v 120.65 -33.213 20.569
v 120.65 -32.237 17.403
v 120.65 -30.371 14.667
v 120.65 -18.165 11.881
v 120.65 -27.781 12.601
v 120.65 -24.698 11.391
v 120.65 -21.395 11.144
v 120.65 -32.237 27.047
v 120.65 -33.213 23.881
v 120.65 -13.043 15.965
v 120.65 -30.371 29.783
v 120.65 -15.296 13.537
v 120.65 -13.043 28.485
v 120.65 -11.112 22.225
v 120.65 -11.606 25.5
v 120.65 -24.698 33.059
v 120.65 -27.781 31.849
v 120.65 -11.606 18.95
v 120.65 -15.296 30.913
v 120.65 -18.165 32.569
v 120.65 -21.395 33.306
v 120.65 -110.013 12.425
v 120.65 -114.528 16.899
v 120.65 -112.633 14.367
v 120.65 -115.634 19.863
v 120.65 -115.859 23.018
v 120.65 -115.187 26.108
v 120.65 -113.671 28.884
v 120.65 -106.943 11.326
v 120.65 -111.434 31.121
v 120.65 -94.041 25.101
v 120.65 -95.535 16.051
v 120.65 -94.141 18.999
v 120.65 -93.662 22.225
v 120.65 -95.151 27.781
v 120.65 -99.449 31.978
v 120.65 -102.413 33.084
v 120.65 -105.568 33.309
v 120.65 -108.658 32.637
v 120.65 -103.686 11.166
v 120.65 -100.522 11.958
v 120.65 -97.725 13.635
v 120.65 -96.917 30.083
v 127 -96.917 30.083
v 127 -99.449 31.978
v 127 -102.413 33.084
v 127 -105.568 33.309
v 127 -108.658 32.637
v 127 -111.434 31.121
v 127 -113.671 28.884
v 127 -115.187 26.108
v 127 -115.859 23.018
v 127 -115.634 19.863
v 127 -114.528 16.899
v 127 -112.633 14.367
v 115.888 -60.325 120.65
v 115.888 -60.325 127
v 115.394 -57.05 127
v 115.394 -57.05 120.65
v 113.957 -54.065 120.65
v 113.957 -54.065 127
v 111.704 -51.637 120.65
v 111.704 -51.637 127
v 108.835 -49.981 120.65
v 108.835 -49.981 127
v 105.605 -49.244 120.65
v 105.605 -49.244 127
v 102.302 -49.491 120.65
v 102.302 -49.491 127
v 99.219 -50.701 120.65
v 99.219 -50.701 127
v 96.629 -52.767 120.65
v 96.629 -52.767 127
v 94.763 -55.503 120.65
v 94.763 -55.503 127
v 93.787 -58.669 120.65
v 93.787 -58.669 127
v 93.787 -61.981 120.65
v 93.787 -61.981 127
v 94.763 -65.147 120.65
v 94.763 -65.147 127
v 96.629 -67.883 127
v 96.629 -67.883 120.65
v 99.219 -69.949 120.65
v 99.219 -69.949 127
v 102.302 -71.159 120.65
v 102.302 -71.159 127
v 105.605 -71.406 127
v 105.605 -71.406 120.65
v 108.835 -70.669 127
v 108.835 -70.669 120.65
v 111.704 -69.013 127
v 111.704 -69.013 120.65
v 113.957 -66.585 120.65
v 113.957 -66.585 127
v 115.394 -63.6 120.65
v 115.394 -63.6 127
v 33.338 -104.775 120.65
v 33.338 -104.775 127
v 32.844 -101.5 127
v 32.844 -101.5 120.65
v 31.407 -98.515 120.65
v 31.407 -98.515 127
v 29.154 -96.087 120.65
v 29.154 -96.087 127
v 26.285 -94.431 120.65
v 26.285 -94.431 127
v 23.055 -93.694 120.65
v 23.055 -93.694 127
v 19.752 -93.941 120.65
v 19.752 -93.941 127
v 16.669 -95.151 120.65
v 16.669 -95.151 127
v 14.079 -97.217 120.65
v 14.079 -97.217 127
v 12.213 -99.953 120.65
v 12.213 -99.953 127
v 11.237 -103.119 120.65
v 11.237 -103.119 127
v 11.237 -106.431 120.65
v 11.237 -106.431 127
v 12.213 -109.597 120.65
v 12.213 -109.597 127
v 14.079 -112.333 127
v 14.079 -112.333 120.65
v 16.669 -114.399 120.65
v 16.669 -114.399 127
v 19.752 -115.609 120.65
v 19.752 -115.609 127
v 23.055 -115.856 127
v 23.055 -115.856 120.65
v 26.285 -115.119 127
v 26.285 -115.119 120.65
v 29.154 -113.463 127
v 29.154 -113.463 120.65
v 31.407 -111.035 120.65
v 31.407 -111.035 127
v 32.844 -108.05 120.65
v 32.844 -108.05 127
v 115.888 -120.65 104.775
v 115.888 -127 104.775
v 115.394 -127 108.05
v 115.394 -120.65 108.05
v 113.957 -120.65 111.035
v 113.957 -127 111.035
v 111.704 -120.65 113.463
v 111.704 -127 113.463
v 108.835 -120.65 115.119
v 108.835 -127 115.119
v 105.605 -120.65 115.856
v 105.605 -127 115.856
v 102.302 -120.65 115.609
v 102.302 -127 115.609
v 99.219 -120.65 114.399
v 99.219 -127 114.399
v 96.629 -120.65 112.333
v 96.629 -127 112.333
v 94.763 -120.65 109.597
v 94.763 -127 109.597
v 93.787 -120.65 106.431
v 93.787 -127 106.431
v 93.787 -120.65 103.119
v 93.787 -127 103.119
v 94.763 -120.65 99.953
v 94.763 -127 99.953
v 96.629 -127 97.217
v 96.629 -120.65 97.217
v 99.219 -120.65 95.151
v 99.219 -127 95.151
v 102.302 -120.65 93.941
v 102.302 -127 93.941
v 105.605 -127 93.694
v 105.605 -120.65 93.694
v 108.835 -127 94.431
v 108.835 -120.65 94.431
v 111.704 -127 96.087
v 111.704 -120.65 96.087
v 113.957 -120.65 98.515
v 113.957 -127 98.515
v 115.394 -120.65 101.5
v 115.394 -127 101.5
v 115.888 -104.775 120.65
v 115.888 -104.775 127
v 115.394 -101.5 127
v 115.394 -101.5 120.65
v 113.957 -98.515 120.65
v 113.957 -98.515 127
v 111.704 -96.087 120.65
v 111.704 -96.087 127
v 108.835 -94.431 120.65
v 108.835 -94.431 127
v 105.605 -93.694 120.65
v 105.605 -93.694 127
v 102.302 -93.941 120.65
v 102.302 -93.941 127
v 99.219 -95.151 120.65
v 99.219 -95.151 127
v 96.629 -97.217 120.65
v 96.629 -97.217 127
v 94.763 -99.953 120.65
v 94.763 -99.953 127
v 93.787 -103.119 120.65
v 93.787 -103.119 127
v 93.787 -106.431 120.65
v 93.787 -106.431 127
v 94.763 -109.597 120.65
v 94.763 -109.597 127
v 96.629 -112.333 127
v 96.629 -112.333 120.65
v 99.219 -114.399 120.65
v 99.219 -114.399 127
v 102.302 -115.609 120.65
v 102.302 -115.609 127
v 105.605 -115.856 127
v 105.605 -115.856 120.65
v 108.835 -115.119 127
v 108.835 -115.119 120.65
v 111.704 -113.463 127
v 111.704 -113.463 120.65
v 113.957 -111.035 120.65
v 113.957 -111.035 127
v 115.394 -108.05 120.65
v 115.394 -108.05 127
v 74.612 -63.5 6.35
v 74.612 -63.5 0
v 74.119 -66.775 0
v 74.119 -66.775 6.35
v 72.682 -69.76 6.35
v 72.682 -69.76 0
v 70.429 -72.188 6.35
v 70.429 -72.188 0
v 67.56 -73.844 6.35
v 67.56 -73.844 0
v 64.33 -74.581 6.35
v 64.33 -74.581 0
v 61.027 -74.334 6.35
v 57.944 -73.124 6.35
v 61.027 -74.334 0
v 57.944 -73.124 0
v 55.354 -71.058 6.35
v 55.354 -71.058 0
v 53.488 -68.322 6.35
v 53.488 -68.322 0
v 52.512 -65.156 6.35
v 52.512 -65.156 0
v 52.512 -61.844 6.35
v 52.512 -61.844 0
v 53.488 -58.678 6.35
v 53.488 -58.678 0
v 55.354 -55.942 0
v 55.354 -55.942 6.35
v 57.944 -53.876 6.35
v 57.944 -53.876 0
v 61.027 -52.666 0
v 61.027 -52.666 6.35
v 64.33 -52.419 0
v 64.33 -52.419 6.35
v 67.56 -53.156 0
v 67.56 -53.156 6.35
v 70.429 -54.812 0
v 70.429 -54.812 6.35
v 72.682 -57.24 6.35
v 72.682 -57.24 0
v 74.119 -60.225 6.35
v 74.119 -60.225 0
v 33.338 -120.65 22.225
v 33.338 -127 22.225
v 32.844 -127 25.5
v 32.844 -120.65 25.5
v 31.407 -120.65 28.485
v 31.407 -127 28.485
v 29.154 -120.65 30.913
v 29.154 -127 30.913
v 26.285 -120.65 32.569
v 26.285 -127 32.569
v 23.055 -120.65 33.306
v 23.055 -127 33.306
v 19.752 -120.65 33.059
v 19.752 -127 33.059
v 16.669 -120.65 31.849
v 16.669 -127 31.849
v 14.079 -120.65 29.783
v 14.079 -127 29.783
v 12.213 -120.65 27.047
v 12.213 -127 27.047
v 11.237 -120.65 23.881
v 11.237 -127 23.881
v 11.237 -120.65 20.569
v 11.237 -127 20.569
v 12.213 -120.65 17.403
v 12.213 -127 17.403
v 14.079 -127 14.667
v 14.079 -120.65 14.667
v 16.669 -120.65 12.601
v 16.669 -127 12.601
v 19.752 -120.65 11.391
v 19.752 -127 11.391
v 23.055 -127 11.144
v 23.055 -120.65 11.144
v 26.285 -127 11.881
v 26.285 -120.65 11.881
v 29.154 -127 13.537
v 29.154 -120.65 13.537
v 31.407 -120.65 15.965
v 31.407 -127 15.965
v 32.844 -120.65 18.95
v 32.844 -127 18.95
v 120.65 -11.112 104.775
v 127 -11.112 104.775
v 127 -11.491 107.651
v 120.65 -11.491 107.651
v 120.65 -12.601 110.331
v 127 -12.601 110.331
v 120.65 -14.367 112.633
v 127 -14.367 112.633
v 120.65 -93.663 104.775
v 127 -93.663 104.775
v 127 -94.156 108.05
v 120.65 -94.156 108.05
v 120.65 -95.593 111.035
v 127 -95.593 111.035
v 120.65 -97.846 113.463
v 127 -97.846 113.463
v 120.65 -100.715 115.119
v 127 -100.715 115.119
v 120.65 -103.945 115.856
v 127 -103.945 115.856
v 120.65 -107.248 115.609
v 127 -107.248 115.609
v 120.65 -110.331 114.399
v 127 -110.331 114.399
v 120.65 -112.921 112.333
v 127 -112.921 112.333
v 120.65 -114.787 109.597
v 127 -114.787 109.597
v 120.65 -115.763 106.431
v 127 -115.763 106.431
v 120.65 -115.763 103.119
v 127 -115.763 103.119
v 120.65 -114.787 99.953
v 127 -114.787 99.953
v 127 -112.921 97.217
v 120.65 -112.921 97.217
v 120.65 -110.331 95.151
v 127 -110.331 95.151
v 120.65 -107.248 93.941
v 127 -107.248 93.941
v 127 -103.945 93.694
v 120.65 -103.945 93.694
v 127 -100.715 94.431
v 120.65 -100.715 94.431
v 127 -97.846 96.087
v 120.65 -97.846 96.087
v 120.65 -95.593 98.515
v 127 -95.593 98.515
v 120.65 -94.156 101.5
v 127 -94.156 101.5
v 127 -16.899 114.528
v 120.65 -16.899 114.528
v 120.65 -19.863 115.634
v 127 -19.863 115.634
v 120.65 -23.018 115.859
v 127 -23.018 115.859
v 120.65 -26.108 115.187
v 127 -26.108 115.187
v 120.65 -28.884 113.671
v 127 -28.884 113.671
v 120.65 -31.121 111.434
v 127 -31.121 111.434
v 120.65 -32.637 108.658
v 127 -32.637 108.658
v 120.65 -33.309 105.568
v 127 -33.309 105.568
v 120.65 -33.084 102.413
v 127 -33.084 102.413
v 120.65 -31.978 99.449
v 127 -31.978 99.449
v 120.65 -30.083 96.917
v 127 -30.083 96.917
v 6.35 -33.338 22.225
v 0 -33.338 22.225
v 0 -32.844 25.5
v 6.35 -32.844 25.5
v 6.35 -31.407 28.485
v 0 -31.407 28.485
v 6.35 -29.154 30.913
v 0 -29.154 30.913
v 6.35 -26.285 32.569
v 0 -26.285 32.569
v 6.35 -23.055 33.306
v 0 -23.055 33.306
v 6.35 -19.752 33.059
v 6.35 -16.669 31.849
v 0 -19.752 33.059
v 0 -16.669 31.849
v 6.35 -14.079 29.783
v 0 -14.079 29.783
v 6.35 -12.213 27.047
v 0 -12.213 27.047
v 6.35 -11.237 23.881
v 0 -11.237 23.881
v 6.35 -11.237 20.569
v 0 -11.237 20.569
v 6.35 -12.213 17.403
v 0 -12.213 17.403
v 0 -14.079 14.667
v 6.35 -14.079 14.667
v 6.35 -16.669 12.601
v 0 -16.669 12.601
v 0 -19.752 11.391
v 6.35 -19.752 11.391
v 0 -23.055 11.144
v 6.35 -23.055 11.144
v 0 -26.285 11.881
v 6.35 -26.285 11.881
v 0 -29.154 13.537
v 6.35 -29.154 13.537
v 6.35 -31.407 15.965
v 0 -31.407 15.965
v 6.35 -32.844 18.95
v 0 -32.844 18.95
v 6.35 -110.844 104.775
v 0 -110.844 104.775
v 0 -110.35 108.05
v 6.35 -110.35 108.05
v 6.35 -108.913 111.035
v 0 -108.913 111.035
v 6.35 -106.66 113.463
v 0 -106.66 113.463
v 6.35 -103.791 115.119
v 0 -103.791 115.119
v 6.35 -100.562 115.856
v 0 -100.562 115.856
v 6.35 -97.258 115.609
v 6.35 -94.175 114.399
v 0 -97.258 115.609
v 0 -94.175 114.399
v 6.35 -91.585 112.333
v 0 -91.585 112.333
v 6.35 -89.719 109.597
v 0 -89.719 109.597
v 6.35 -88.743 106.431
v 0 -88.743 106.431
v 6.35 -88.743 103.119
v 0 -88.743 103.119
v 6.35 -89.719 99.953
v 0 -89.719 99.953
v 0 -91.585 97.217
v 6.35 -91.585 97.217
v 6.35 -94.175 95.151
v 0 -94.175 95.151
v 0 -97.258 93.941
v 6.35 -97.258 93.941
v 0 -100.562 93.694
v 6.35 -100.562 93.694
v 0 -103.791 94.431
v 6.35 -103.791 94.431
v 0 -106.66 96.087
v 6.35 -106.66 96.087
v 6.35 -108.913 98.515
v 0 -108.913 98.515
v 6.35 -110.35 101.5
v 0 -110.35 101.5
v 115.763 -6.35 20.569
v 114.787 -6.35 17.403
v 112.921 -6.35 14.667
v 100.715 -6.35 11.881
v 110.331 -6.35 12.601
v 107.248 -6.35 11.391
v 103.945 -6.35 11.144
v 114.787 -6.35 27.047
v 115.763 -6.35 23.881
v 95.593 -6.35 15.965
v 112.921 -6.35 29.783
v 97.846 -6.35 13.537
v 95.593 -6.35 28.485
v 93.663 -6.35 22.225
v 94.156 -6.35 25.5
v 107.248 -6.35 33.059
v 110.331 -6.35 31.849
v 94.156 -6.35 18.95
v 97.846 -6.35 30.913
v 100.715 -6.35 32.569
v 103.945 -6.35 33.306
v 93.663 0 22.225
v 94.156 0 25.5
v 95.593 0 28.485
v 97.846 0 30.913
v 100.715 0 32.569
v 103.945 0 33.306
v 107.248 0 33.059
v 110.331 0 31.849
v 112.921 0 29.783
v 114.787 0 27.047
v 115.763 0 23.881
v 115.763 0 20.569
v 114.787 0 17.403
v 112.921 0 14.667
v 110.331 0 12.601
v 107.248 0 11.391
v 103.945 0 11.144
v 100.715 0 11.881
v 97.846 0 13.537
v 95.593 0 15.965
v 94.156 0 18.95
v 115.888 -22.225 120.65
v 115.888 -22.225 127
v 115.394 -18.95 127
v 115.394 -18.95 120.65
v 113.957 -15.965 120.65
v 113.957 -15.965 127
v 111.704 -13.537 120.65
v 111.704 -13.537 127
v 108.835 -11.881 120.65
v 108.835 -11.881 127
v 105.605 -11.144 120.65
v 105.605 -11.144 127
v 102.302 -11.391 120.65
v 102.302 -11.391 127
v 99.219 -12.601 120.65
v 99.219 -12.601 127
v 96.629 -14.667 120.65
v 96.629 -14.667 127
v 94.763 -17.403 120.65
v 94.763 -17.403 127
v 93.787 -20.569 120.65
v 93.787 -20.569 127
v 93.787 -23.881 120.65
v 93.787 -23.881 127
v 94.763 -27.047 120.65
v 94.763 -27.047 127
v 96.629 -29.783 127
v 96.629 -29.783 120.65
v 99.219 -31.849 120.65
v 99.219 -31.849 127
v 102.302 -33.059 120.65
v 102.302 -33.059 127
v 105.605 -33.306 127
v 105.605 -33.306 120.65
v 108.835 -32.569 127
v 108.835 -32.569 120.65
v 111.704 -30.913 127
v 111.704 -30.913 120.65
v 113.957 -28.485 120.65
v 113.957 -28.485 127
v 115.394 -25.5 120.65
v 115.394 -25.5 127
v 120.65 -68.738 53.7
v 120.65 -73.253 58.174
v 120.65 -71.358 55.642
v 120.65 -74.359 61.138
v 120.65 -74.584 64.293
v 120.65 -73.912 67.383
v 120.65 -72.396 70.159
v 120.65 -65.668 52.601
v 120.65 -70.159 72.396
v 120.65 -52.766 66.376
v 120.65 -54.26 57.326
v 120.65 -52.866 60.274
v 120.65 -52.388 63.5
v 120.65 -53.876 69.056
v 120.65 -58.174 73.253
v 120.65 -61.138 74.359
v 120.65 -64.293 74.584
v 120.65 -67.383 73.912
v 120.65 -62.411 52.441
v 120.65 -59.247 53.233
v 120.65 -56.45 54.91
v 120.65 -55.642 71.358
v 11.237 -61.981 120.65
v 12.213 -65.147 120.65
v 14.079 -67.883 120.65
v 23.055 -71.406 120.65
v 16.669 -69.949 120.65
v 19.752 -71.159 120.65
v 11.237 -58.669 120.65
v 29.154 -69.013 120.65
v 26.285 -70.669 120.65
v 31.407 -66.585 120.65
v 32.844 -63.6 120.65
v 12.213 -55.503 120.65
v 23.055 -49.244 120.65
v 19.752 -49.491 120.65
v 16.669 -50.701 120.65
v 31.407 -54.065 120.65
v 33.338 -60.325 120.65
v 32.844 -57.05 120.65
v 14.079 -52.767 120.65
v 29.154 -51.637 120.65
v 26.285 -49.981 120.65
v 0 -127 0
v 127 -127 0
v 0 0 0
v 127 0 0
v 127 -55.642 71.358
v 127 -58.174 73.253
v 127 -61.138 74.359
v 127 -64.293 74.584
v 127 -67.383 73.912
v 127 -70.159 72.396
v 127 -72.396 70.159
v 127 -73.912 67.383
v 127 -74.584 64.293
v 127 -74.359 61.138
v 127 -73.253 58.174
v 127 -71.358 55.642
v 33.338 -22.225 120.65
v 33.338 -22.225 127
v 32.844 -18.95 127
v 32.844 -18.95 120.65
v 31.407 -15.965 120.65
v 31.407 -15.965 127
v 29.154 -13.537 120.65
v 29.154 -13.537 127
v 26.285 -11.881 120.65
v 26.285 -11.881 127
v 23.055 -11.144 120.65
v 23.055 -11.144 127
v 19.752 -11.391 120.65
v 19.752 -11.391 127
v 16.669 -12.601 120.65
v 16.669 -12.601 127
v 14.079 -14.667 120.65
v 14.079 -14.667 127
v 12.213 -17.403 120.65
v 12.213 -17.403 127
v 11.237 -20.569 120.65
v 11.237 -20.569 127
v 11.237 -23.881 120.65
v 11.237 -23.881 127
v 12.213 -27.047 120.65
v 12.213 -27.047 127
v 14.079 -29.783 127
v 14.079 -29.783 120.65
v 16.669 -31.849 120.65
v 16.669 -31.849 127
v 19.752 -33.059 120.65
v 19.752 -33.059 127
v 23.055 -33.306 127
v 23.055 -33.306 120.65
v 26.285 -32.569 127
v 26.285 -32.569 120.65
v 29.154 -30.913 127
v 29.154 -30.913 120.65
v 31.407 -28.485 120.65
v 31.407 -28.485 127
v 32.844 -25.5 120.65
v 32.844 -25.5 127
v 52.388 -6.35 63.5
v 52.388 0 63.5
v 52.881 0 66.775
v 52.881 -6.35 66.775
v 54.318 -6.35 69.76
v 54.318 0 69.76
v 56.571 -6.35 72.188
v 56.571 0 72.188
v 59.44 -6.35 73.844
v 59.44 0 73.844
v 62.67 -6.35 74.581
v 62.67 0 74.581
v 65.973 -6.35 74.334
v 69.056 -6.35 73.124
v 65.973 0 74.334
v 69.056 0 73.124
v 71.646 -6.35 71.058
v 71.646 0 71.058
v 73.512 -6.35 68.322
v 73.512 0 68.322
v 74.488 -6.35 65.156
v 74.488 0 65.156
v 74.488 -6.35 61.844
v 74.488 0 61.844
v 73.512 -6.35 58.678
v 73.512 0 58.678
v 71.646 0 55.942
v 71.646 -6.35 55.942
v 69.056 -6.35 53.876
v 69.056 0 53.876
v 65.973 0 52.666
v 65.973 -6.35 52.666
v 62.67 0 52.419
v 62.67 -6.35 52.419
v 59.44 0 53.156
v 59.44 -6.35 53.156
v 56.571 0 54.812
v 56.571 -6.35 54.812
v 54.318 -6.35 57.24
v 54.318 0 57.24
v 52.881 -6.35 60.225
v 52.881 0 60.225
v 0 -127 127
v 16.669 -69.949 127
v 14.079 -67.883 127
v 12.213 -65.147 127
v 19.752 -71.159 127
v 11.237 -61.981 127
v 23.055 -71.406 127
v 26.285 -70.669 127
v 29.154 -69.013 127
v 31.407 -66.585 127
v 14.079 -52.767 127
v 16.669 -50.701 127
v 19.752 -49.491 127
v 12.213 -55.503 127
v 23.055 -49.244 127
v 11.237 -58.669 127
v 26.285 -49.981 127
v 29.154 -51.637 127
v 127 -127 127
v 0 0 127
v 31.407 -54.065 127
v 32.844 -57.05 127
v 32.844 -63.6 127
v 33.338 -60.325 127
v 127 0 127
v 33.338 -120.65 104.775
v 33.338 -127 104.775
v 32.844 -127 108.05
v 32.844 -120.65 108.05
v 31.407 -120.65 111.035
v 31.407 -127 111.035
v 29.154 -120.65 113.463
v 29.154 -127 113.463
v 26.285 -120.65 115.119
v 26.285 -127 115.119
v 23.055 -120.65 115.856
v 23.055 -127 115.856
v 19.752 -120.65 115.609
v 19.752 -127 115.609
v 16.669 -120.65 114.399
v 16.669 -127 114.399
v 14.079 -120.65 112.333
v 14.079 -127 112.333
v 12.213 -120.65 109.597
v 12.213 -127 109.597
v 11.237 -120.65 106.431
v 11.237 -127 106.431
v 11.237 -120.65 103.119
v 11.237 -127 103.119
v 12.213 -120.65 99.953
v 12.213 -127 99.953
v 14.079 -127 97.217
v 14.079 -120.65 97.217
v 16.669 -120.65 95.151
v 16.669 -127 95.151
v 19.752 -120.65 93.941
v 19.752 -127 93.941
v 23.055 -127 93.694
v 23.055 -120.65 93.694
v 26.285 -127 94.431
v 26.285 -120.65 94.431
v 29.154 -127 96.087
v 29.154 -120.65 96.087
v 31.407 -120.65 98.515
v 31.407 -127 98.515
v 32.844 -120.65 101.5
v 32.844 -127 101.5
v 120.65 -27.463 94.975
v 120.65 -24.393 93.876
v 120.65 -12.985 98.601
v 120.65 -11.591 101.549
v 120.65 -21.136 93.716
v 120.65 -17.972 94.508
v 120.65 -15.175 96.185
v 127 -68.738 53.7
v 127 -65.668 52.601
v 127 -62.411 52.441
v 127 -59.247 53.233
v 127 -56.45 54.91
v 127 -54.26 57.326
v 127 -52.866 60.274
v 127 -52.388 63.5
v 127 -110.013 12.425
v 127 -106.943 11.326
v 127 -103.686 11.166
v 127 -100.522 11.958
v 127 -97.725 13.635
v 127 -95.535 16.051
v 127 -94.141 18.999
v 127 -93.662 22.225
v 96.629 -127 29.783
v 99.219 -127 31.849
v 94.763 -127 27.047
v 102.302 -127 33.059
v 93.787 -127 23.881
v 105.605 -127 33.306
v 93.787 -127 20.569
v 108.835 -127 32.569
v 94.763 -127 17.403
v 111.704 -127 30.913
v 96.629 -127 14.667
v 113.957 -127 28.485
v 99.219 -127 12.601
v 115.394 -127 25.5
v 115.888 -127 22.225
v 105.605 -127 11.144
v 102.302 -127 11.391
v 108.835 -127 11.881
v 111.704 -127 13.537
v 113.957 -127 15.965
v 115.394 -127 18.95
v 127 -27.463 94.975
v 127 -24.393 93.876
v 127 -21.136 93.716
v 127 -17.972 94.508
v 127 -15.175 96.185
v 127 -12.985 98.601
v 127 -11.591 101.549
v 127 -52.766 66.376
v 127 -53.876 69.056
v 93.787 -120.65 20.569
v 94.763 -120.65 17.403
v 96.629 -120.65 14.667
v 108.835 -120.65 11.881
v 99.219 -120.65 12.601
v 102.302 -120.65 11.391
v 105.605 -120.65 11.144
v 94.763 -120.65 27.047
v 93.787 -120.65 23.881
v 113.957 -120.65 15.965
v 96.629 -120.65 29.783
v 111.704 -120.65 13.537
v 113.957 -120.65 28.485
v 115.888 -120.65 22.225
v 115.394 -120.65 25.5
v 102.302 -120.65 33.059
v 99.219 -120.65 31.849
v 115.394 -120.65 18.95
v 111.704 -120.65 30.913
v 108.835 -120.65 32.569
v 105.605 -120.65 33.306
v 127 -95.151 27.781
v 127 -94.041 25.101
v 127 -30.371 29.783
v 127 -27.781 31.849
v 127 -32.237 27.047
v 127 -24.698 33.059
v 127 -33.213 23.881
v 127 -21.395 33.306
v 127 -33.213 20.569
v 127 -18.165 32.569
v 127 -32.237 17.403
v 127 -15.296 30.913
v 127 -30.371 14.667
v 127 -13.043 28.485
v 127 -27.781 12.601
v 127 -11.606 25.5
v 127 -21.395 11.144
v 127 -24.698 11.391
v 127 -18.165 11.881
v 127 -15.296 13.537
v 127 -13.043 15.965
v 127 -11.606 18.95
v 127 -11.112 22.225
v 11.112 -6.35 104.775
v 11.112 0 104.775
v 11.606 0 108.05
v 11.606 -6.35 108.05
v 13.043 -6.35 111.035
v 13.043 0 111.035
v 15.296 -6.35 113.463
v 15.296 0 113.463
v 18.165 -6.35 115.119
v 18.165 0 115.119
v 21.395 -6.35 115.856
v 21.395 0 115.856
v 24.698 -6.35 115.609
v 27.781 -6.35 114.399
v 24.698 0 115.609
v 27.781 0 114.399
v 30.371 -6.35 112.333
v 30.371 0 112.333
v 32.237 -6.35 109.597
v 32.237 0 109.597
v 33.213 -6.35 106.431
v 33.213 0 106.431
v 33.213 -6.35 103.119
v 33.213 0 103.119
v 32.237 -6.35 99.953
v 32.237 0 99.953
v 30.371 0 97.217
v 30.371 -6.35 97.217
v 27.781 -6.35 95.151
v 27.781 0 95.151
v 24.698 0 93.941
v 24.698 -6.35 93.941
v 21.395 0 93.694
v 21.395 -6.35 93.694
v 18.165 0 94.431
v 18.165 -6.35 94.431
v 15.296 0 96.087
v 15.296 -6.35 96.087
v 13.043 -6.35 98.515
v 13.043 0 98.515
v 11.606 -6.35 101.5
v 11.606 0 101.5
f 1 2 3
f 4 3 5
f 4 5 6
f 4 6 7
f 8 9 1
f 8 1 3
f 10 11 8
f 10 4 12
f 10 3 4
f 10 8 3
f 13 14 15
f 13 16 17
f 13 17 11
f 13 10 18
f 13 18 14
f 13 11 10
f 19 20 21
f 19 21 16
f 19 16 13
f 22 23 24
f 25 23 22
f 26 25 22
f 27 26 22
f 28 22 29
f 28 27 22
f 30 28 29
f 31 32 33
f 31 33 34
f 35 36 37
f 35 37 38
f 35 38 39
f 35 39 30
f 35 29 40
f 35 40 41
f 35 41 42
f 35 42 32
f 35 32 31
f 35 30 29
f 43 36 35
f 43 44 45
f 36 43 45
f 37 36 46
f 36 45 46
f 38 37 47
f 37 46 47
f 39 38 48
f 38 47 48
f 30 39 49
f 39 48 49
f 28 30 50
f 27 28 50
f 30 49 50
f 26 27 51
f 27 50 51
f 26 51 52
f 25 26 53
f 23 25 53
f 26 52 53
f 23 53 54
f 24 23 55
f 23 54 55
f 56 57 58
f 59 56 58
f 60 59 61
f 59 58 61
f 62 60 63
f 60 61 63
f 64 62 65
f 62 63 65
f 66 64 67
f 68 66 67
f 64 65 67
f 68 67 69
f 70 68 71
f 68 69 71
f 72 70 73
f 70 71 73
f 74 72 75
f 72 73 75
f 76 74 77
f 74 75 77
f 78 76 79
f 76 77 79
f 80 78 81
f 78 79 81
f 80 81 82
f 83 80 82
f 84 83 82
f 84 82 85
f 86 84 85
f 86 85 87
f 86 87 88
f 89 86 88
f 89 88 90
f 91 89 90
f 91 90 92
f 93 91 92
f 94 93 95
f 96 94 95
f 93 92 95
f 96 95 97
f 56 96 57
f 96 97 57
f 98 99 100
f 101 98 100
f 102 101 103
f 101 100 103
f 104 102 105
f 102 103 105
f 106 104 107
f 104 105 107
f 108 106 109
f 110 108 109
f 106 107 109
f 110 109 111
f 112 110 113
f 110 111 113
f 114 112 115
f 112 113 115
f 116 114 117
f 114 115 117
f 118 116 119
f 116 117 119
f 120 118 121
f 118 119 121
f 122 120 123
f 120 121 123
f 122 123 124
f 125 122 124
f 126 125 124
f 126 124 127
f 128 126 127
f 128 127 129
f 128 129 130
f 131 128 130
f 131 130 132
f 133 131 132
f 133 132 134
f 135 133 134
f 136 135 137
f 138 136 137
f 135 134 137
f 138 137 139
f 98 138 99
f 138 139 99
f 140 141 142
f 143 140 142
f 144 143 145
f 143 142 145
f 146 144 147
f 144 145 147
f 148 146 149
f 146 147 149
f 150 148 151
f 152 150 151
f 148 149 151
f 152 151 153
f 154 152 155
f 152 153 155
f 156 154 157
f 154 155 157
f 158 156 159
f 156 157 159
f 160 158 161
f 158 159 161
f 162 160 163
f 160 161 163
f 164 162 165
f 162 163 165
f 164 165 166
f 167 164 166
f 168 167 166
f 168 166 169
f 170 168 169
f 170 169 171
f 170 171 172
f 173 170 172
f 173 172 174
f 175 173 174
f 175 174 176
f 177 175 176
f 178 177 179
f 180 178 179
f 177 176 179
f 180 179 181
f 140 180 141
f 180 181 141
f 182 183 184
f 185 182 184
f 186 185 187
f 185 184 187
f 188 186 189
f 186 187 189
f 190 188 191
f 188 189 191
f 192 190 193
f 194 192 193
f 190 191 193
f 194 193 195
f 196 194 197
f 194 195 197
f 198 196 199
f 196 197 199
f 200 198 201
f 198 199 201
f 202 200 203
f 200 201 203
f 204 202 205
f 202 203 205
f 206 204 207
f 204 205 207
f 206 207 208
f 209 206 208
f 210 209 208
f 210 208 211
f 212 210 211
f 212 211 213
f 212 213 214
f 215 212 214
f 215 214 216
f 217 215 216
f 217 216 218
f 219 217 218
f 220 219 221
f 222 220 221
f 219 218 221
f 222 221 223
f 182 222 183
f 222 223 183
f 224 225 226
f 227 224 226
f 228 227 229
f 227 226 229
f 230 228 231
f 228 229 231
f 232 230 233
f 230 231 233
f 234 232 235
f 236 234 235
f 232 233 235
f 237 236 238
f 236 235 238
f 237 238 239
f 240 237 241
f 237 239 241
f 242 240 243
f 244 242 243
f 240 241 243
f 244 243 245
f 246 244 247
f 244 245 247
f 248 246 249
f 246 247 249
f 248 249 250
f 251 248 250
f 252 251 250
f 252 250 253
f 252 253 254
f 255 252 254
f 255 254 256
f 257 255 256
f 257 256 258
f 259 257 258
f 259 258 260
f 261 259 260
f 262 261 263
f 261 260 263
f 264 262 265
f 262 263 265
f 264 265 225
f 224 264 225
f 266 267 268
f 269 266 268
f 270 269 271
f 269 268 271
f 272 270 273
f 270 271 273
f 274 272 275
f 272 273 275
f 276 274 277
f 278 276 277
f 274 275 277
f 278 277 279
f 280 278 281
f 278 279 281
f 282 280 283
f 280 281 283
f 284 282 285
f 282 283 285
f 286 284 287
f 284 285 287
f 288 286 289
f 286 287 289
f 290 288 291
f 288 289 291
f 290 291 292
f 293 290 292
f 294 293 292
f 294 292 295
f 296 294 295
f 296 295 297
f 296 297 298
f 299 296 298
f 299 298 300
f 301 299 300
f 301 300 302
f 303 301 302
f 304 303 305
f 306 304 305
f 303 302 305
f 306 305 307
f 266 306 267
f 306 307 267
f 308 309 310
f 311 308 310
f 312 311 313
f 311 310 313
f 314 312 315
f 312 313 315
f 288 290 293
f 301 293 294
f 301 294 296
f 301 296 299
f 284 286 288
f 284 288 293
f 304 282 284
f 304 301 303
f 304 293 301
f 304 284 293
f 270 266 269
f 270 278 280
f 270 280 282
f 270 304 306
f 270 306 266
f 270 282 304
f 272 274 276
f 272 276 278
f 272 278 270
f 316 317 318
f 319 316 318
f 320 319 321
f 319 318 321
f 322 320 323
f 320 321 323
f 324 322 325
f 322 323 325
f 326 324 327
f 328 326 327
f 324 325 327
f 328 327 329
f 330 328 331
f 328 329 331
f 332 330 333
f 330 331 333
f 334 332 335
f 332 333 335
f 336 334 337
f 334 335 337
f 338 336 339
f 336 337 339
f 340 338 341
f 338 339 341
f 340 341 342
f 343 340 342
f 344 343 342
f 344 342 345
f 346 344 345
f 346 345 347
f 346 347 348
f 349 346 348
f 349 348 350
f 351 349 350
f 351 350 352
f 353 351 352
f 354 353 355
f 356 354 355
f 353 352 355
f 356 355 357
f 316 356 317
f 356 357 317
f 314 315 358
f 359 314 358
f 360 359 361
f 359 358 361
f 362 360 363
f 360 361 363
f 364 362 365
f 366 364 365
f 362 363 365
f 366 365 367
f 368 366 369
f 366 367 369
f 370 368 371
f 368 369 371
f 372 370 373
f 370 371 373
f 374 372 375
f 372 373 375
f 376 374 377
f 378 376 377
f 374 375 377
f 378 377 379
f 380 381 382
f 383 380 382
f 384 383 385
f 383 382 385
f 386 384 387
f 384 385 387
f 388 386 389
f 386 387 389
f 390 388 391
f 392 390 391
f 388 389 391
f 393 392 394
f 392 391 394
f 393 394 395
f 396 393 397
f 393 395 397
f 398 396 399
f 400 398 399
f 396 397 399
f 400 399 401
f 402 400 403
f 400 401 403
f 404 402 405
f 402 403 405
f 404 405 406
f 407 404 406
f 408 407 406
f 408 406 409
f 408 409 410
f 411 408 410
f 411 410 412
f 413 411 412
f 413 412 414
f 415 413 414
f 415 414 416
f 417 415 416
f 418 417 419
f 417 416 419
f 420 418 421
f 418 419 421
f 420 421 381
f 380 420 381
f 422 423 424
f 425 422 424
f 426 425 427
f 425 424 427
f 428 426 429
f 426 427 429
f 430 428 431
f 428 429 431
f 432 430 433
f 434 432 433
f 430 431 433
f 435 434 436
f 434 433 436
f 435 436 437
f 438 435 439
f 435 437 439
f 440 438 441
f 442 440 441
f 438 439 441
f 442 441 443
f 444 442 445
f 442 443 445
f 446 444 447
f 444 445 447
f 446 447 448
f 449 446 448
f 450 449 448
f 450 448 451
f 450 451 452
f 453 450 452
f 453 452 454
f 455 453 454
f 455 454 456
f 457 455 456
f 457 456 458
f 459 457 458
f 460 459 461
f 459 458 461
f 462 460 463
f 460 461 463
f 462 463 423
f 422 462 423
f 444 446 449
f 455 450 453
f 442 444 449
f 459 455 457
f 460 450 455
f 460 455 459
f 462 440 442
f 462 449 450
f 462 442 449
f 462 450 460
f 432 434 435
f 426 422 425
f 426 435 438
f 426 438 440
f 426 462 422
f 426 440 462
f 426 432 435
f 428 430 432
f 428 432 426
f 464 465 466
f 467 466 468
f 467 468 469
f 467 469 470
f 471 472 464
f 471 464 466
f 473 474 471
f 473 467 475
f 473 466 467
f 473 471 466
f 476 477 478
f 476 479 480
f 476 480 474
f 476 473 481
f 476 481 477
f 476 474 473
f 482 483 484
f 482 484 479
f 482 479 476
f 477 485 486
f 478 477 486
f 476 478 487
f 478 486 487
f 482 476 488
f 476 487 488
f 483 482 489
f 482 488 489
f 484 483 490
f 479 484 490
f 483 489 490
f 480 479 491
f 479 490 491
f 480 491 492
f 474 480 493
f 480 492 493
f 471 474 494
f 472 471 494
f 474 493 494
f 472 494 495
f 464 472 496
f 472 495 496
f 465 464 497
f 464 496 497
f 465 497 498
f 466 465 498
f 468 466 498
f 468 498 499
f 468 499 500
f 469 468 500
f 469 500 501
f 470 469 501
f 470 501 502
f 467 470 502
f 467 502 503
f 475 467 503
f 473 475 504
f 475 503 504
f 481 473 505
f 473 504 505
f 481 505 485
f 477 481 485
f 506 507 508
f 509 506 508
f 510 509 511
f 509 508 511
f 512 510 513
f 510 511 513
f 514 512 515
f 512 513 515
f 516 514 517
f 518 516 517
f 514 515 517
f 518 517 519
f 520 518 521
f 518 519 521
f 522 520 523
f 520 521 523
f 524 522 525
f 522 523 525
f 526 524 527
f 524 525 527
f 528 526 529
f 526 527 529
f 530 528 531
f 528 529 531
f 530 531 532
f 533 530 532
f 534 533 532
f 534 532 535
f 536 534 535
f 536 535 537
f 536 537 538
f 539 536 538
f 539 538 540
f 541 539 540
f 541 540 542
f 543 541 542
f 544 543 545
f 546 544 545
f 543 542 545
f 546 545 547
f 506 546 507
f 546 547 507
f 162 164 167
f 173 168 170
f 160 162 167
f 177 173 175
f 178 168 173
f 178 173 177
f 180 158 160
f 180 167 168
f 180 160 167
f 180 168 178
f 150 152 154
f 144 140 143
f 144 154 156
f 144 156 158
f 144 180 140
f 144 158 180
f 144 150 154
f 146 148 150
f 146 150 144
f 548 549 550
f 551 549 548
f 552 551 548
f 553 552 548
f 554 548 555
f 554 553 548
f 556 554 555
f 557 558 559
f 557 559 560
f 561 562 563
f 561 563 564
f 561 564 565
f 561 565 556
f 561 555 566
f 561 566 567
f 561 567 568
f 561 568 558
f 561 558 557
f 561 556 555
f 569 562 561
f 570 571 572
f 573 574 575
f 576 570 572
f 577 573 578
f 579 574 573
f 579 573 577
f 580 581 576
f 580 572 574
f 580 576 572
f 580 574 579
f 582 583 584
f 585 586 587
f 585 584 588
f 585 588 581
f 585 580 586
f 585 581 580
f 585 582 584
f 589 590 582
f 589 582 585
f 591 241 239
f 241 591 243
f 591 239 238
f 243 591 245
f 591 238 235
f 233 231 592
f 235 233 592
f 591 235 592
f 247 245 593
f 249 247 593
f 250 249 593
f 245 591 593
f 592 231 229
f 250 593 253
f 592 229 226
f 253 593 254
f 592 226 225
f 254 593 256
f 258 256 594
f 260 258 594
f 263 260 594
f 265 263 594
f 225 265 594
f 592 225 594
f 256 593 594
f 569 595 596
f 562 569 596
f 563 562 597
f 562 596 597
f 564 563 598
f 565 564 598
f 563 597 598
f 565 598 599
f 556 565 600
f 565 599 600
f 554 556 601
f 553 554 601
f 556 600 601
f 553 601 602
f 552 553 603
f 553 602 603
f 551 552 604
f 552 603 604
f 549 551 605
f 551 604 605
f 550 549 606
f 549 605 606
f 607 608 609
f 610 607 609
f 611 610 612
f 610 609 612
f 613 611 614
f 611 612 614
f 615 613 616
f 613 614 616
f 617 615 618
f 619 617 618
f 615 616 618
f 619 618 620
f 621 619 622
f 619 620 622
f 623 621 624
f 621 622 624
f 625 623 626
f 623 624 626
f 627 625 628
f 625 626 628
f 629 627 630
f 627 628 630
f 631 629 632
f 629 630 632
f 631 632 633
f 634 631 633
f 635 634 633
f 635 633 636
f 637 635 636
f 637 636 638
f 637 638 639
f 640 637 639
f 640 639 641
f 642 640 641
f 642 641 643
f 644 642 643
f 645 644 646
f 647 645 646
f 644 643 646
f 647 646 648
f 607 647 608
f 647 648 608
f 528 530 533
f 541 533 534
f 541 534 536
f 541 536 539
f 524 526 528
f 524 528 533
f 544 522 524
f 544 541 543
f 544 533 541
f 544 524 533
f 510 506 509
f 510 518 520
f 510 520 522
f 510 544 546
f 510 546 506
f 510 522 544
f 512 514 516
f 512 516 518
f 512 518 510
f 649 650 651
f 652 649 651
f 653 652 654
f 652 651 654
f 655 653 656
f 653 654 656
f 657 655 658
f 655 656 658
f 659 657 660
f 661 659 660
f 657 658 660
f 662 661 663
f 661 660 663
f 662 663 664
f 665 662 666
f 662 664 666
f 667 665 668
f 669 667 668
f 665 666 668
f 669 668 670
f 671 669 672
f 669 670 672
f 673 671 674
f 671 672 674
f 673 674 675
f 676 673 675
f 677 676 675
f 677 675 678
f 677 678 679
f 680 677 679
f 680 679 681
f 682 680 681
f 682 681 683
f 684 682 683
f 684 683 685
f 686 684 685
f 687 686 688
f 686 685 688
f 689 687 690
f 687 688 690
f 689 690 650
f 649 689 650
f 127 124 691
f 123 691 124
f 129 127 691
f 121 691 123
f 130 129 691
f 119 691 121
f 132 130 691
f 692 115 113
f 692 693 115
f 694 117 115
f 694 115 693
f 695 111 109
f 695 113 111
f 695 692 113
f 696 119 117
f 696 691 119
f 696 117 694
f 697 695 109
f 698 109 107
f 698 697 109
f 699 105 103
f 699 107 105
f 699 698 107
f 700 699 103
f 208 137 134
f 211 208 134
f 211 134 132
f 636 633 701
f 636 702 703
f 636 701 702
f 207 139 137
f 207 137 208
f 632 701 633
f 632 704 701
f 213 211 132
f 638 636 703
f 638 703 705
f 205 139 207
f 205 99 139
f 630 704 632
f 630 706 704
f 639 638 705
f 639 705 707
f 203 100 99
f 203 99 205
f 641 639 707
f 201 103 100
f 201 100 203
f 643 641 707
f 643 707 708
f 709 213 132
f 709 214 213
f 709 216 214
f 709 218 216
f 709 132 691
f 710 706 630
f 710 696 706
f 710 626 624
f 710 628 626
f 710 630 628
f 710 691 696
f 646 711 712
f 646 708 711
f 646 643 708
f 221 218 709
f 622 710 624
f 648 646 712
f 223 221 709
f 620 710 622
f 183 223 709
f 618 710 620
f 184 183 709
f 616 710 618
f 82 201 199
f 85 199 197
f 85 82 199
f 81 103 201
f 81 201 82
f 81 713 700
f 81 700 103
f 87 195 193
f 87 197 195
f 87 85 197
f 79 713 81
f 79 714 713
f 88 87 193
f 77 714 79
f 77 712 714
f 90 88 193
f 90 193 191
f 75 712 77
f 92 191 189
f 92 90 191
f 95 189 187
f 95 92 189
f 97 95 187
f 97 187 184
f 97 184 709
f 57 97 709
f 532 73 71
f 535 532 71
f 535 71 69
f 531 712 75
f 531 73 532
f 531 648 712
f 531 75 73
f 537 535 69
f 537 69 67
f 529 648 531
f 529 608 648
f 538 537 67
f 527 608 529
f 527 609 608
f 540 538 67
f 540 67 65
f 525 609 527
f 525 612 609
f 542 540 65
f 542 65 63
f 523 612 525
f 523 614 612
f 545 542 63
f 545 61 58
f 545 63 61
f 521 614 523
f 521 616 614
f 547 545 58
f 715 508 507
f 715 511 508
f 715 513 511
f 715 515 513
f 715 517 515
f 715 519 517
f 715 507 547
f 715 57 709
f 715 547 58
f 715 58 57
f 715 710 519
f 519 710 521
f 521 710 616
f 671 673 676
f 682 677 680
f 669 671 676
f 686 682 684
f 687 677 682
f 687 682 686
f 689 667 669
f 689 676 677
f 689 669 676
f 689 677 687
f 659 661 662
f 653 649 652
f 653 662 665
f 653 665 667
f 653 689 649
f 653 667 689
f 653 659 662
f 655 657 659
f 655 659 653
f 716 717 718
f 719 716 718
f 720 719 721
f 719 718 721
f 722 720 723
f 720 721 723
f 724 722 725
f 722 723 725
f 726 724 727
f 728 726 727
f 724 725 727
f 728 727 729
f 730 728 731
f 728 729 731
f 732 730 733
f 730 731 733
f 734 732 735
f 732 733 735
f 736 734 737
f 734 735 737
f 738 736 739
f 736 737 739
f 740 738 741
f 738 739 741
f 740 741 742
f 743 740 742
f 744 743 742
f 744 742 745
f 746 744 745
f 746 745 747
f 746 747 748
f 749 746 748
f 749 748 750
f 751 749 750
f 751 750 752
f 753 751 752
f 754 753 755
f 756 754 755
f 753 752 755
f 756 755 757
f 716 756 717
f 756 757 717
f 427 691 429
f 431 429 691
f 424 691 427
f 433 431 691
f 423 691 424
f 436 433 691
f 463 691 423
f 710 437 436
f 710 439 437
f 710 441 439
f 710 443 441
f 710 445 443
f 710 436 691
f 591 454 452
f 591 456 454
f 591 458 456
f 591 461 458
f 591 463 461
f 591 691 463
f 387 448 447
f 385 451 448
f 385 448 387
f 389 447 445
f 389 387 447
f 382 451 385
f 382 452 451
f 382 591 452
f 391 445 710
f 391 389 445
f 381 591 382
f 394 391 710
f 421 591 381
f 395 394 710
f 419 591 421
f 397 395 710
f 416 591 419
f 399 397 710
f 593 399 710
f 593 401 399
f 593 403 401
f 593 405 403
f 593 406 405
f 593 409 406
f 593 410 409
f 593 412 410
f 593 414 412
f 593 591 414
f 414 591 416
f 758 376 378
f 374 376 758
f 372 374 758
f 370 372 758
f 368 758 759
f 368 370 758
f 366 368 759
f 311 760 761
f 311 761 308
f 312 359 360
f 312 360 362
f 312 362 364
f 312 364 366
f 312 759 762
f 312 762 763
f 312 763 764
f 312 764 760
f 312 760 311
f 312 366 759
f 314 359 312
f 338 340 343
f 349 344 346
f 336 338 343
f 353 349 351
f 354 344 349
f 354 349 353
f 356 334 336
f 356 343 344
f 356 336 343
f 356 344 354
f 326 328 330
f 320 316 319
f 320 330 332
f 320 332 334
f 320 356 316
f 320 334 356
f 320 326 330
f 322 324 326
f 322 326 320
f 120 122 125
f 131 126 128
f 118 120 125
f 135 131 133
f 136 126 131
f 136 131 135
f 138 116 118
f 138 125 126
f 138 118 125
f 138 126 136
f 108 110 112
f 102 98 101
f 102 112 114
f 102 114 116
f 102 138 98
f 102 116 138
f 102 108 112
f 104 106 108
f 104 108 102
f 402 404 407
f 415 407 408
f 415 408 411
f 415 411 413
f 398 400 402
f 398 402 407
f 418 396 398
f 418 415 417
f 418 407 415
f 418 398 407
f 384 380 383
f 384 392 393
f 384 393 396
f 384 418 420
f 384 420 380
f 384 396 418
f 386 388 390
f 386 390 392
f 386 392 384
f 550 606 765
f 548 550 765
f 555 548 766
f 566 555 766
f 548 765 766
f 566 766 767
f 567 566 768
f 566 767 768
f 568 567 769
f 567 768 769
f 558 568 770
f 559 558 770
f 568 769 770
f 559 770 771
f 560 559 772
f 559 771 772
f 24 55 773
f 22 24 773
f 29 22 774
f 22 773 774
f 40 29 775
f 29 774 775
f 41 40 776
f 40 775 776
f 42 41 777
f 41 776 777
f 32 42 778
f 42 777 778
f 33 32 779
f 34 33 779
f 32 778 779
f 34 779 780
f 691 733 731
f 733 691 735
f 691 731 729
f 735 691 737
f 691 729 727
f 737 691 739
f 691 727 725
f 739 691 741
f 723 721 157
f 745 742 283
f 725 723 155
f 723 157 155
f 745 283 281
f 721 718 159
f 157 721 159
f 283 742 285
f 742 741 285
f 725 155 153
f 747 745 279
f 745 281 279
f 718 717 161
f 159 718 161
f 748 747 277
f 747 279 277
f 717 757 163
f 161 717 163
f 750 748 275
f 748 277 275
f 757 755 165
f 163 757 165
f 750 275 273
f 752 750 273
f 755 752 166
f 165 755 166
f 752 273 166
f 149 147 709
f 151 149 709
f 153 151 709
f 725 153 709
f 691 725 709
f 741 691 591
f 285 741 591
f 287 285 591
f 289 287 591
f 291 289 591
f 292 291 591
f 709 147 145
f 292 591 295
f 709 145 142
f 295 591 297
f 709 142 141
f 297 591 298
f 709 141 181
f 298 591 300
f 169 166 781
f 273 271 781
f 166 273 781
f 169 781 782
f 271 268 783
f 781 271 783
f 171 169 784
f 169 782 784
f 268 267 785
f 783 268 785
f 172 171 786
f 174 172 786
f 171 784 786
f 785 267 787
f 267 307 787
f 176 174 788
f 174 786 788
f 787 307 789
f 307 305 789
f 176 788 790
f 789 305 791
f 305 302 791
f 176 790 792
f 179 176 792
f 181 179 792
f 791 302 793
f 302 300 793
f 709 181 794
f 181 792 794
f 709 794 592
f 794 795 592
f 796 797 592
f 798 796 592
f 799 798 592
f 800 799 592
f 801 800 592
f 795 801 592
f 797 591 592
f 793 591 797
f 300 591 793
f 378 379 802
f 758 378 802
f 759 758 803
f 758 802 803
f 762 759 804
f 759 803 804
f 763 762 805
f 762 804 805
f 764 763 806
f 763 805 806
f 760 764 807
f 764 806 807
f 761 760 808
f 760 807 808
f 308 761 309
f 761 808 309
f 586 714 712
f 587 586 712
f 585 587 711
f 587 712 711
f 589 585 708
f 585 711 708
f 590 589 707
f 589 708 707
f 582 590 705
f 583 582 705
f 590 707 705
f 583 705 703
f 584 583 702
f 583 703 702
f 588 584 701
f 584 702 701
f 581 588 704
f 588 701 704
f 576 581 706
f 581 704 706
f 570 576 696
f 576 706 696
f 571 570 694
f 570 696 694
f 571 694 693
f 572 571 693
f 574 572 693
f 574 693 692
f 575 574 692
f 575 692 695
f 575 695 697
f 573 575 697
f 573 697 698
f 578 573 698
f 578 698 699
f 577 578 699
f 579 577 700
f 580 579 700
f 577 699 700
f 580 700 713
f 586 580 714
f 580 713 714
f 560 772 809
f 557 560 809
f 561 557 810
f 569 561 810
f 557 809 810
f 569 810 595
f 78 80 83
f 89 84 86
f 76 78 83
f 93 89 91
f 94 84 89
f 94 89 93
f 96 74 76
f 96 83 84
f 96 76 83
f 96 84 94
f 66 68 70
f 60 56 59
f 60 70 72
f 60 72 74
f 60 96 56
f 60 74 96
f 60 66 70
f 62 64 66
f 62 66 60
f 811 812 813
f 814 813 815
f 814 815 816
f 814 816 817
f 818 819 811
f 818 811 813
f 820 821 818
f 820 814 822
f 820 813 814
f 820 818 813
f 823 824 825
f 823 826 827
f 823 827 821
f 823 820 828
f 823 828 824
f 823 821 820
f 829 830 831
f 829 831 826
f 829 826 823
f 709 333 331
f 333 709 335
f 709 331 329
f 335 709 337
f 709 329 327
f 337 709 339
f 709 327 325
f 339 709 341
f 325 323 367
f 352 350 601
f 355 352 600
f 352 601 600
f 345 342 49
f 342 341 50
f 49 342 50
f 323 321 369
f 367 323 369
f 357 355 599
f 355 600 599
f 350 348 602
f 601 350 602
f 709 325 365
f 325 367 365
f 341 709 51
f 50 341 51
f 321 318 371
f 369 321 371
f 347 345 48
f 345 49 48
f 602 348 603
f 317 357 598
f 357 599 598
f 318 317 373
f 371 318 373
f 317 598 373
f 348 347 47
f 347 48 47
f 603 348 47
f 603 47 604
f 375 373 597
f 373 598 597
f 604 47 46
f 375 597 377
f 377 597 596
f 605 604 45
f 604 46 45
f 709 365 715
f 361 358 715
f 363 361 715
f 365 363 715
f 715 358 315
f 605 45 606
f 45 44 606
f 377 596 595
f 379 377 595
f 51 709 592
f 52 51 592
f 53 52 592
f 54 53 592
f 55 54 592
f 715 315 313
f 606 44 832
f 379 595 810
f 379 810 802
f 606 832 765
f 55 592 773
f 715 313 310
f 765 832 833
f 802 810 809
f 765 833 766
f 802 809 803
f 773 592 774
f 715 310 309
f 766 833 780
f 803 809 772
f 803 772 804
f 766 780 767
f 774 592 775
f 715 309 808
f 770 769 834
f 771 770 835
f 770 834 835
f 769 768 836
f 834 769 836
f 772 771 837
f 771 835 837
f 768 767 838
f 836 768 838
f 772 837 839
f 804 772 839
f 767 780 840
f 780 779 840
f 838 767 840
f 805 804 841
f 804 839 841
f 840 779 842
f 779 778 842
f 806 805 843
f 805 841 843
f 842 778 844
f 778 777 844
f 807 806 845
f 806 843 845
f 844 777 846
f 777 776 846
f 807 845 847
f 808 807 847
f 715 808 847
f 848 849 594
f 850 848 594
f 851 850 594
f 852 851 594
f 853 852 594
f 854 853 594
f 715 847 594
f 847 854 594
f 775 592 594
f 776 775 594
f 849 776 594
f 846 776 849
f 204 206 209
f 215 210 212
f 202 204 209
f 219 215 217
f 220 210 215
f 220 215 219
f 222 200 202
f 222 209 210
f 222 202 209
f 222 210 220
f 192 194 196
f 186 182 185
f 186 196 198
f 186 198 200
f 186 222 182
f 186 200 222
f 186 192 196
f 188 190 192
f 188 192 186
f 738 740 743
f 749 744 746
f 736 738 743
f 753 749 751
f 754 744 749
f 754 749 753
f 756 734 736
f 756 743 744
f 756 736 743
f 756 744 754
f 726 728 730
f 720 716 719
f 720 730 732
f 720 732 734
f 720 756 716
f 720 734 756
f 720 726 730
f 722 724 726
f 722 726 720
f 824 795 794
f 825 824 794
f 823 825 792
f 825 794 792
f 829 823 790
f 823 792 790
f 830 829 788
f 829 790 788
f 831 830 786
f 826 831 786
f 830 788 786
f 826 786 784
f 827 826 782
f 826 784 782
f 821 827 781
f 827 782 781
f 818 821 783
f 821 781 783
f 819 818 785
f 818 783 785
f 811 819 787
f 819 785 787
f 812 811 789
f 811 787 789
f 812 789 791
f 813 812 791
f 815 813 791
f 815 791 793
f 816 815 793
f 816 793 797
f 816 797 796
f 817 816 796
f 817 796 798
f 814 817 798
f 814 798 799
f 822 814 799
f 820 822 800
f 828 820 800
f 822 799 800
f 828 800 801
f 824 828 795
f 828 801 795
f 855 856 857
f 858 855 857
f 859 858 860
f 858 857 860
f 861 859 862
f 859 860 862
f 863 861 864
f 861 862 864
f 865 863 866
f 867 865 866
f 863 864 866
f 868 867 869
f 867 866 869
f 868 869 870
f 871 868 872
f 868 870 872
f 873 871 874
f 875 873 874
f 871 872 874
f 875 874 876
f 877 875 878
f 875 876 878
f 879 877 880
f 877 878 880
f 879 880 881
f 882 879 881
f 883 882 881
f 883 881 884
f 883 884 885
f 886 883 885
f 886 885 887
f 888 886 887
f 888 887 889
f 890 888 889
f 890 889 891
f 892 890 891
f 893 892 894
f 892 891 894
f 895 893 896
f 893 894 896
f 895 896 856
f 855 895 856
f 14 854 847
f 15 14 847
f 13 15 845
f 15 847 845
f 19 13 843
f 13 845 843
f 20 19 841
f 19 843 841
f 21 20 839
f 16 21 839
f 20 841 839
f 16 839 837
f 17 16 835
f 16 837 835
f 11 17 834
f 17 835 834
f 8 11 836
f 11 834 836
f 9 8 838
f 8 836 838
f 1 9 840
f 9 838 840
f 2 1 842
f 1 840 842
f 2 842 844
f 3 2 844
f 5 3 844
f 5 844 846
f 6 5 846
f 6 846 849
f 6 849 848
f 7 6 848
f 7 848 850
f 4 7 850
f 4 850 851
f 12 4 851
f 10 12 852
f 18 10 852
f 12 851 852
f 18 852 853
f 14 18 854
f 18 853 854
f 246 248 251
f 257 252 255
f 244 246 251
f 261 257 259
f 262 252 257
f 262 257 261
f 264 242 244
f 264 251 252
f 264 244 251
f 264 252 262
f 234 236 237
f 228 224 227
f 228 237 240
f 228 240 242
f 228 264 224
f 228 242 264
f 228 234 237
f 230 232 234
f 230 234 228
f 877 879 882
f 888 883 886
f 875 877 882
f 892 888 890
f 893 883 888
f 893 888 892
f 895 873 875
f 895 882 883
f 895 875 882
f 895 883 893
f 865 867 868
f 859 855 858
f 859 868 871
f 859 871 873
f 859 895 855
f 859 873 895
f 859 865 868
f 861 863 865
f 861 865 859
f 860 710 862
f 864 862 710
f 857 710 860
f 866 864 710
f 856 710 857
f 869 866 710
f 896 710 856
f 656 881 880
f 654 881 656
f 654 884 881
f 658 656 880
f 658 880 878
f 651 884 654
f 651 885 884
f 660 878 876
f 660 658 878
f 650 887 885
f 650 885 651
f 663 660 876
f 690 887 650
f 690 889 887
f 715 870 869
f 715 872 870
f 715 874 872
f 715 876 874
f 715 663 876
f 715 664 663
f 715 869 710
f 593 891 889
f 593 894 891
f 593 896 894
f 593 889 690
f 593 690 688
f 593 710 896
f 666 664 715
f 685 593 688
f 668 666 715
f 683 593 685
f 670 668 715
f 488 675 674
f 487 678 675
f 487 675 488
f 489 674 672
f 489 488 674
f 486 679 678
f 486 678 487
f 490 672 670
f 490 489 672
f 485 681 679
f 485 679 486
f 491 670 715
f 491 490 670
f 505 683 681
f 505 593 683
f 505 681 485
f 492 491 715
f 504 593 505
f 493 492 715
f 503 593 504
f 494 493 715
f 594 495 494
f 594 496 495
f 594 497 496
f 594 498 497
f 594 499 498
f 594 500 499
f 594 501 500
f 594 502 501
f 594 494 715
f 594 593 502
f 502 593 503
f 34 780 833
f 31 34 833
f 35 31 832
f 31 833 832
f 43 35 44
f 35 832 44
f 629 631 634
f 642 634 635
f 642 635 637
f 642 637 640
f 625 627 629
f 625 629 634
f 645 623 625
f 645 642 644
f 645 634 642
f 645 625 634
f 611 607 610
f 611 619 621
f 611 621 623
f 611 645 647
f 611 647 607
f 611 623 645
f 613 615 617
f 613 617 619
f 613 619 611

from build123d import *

# Parameters (mm, degrees)
F0_W      = 127
F0_H      = 127
F1_DEPTH  = 127
F2_R      = 11.1125
F3_DEPTH  = 6.35
F4_R      = 11.1125
F5_DEPTH  = 6.35
F6_R      = 11.1125
F7_DEPTH  = 6.35
F8_R      = 11.1125
F9_DEPTH  = 6.35
F10_R     = 11.1125
F11_DEPTH = 6.35
F12_R     = 11.1125
F13_DEPTH = 6.35


with BuildPart() as f1:
    # F0 (on Top) → F1 (new body)
    with BuildSketch(Plane.XY):
        with Locations((63.5, -63.5)):
            Rectangle(F0_W, F0_H)
    extrude(amount=F1_DEPTH)

    # F2 (on face) → F3 (cut)
    with BuildSketch(Plane(origin=(0, 0, 0), x_dir=(1, 0, 0), z_dir=(0, 0, -1))):
        with Locations((63.5, 63.5)):
            Circle(F2_R)
    extrude(amount=-F3_DEPTH, mode=Mode.SUBTRACT)

    # F4 (on face) → F5 (cut)
    with BuildSketch(Plane(origin=(0, 0, 0), x_dir=(0, -1, 0), z_dir=(-1, 0, 0))):
        with Locations((99.731132, 104.775)):
            Circle(F4_R)
        with Locations((22.225, 22.225)):
            Circle(F4_R)
    extrude(amount=-F5_DEPTH, mode=Mode.SUBTRACT)

    # F6 (on face) → F7 (cut)
    with BuildSketch(Plane(origin=(0, 0, 0), x_dir=(-1, 0, 0), z_dir=(0, 1, 0))):
        with Locations((-22.225, 104.775)):
            Circle(F6_R)
        with Locations((-63.5, 63.5)):
            Circle(F6_R)
        with Locations((-104.775, 22.225)):
            Circle(F6_R)
    extrude(amount=-F7_DEPTH, mode=Mode.SUBTRACT)

    # F8 (on face) → F9 (cut)
    with BuildSketch(Plane.XY.offset(127)):
        with Locations((22.225, -22.225)):
            Circle(F8_R)
        with Locations((22.225, -60.325)):
            Circle(F8_R)
        with Locations((22.225, -104.775)):
            Circle(F8_R)
        with Locations((104.775, -60.325)):
            Circle(F8_R)
        with Locations((104.775, -104.775)):
            Circle(F8_R)
        with Locations((104.775, -22.225)):
            Circle(F8_R)
    extrude(amount=-F9_DEPTH, mode=Mode.SUBTRACT)

    # F10 (on face) → F11 (cut)
    with BuildSketch(Plane.XZ.offset(127)):
        with Locations((104.775, 22.225)):
            Circle(F10_R)
        with Locations((104.775, 104.775)):
            Circle(F10_R)
        with Locations((22.225, 104.775)):
            Circle(F10_R)
        with Locations((22.225, 22.225)):
            Circle(F10_R)
    extrude(amount=-F11_DEPTH, mode=Mode.SUBTRACT)

    # F12 (on face) → F13 (cut)
    with BuildSketch(Plane.YZ.offset(127)):
        with BuildLine():
            ThreePointArc((-11.1125, 104.775), (-11.958389, 109.02757), (-14.367276, 112.632724))
            Line((-14.367276, 112.632724), (-30.082724, 96.917276))
            ThreePointArc((-30.082724, 96.917276), (-17.97243, 94.508389), (-11.1125, 104.775))
        make_face()
        with BuildLine():
            ThreePointArc((-93.6625, 22.225), (-94.508389, 26.47757), (-96.917276, 30.082724))
            Line((-96.917276, 30.082724), (-112.632724, 14.367276))
            ThreePointArc((-112.632724, 14.367276), (-100.52243, 11.958389), (-93.6625, 22.225))
        make_face()
        with BuildLine():
            Line((-112.632724, 14.367276), (-96.917276, 30.082724))
            ThreePointArc((-96.917276, 30.082724), (-112.632724, 30.082724), (-112.632724, 14.367276))
        make_face()
        with BuildLine():
            ThreePointArc((-52.3875, 63.5), (-53.233389, 67.75257), (-55.642276, 71.357724))
            Line((-55.642276, 71.357724), (-71.357724, 55.642276))
            ThreePointArc((-71.357724, 55.642276), (-59.24743, 53.233389), (-52.3875, 63.5))
        make_face()
        with BuildLine():
            Line((-71.357724, 55.642276), (-55.642276, 71.357724))
            ThreePointArc((-55.642276, 71.357724), (-71.357724, 71.357724), (-71.357724, 55.642276))
        make_face()
        with BuildLine():
            Line((-30.082724, 96.917276), (-14.367276, 112.632724))
            ThreePointArc((-14.367276, 112.632724), (-30.082724, 112.632724), (-30.082724, 96.917276))
        make_face()
        with Locations((-22.225, 22.225)):
            Circle(F12_R)
        with Locations((-104.775, 104.775)):
            Circle(F12_R)
    extrude(amount=-F13_DEPTH, mode=Mode.SUBTRACT)


solid = f1.part
